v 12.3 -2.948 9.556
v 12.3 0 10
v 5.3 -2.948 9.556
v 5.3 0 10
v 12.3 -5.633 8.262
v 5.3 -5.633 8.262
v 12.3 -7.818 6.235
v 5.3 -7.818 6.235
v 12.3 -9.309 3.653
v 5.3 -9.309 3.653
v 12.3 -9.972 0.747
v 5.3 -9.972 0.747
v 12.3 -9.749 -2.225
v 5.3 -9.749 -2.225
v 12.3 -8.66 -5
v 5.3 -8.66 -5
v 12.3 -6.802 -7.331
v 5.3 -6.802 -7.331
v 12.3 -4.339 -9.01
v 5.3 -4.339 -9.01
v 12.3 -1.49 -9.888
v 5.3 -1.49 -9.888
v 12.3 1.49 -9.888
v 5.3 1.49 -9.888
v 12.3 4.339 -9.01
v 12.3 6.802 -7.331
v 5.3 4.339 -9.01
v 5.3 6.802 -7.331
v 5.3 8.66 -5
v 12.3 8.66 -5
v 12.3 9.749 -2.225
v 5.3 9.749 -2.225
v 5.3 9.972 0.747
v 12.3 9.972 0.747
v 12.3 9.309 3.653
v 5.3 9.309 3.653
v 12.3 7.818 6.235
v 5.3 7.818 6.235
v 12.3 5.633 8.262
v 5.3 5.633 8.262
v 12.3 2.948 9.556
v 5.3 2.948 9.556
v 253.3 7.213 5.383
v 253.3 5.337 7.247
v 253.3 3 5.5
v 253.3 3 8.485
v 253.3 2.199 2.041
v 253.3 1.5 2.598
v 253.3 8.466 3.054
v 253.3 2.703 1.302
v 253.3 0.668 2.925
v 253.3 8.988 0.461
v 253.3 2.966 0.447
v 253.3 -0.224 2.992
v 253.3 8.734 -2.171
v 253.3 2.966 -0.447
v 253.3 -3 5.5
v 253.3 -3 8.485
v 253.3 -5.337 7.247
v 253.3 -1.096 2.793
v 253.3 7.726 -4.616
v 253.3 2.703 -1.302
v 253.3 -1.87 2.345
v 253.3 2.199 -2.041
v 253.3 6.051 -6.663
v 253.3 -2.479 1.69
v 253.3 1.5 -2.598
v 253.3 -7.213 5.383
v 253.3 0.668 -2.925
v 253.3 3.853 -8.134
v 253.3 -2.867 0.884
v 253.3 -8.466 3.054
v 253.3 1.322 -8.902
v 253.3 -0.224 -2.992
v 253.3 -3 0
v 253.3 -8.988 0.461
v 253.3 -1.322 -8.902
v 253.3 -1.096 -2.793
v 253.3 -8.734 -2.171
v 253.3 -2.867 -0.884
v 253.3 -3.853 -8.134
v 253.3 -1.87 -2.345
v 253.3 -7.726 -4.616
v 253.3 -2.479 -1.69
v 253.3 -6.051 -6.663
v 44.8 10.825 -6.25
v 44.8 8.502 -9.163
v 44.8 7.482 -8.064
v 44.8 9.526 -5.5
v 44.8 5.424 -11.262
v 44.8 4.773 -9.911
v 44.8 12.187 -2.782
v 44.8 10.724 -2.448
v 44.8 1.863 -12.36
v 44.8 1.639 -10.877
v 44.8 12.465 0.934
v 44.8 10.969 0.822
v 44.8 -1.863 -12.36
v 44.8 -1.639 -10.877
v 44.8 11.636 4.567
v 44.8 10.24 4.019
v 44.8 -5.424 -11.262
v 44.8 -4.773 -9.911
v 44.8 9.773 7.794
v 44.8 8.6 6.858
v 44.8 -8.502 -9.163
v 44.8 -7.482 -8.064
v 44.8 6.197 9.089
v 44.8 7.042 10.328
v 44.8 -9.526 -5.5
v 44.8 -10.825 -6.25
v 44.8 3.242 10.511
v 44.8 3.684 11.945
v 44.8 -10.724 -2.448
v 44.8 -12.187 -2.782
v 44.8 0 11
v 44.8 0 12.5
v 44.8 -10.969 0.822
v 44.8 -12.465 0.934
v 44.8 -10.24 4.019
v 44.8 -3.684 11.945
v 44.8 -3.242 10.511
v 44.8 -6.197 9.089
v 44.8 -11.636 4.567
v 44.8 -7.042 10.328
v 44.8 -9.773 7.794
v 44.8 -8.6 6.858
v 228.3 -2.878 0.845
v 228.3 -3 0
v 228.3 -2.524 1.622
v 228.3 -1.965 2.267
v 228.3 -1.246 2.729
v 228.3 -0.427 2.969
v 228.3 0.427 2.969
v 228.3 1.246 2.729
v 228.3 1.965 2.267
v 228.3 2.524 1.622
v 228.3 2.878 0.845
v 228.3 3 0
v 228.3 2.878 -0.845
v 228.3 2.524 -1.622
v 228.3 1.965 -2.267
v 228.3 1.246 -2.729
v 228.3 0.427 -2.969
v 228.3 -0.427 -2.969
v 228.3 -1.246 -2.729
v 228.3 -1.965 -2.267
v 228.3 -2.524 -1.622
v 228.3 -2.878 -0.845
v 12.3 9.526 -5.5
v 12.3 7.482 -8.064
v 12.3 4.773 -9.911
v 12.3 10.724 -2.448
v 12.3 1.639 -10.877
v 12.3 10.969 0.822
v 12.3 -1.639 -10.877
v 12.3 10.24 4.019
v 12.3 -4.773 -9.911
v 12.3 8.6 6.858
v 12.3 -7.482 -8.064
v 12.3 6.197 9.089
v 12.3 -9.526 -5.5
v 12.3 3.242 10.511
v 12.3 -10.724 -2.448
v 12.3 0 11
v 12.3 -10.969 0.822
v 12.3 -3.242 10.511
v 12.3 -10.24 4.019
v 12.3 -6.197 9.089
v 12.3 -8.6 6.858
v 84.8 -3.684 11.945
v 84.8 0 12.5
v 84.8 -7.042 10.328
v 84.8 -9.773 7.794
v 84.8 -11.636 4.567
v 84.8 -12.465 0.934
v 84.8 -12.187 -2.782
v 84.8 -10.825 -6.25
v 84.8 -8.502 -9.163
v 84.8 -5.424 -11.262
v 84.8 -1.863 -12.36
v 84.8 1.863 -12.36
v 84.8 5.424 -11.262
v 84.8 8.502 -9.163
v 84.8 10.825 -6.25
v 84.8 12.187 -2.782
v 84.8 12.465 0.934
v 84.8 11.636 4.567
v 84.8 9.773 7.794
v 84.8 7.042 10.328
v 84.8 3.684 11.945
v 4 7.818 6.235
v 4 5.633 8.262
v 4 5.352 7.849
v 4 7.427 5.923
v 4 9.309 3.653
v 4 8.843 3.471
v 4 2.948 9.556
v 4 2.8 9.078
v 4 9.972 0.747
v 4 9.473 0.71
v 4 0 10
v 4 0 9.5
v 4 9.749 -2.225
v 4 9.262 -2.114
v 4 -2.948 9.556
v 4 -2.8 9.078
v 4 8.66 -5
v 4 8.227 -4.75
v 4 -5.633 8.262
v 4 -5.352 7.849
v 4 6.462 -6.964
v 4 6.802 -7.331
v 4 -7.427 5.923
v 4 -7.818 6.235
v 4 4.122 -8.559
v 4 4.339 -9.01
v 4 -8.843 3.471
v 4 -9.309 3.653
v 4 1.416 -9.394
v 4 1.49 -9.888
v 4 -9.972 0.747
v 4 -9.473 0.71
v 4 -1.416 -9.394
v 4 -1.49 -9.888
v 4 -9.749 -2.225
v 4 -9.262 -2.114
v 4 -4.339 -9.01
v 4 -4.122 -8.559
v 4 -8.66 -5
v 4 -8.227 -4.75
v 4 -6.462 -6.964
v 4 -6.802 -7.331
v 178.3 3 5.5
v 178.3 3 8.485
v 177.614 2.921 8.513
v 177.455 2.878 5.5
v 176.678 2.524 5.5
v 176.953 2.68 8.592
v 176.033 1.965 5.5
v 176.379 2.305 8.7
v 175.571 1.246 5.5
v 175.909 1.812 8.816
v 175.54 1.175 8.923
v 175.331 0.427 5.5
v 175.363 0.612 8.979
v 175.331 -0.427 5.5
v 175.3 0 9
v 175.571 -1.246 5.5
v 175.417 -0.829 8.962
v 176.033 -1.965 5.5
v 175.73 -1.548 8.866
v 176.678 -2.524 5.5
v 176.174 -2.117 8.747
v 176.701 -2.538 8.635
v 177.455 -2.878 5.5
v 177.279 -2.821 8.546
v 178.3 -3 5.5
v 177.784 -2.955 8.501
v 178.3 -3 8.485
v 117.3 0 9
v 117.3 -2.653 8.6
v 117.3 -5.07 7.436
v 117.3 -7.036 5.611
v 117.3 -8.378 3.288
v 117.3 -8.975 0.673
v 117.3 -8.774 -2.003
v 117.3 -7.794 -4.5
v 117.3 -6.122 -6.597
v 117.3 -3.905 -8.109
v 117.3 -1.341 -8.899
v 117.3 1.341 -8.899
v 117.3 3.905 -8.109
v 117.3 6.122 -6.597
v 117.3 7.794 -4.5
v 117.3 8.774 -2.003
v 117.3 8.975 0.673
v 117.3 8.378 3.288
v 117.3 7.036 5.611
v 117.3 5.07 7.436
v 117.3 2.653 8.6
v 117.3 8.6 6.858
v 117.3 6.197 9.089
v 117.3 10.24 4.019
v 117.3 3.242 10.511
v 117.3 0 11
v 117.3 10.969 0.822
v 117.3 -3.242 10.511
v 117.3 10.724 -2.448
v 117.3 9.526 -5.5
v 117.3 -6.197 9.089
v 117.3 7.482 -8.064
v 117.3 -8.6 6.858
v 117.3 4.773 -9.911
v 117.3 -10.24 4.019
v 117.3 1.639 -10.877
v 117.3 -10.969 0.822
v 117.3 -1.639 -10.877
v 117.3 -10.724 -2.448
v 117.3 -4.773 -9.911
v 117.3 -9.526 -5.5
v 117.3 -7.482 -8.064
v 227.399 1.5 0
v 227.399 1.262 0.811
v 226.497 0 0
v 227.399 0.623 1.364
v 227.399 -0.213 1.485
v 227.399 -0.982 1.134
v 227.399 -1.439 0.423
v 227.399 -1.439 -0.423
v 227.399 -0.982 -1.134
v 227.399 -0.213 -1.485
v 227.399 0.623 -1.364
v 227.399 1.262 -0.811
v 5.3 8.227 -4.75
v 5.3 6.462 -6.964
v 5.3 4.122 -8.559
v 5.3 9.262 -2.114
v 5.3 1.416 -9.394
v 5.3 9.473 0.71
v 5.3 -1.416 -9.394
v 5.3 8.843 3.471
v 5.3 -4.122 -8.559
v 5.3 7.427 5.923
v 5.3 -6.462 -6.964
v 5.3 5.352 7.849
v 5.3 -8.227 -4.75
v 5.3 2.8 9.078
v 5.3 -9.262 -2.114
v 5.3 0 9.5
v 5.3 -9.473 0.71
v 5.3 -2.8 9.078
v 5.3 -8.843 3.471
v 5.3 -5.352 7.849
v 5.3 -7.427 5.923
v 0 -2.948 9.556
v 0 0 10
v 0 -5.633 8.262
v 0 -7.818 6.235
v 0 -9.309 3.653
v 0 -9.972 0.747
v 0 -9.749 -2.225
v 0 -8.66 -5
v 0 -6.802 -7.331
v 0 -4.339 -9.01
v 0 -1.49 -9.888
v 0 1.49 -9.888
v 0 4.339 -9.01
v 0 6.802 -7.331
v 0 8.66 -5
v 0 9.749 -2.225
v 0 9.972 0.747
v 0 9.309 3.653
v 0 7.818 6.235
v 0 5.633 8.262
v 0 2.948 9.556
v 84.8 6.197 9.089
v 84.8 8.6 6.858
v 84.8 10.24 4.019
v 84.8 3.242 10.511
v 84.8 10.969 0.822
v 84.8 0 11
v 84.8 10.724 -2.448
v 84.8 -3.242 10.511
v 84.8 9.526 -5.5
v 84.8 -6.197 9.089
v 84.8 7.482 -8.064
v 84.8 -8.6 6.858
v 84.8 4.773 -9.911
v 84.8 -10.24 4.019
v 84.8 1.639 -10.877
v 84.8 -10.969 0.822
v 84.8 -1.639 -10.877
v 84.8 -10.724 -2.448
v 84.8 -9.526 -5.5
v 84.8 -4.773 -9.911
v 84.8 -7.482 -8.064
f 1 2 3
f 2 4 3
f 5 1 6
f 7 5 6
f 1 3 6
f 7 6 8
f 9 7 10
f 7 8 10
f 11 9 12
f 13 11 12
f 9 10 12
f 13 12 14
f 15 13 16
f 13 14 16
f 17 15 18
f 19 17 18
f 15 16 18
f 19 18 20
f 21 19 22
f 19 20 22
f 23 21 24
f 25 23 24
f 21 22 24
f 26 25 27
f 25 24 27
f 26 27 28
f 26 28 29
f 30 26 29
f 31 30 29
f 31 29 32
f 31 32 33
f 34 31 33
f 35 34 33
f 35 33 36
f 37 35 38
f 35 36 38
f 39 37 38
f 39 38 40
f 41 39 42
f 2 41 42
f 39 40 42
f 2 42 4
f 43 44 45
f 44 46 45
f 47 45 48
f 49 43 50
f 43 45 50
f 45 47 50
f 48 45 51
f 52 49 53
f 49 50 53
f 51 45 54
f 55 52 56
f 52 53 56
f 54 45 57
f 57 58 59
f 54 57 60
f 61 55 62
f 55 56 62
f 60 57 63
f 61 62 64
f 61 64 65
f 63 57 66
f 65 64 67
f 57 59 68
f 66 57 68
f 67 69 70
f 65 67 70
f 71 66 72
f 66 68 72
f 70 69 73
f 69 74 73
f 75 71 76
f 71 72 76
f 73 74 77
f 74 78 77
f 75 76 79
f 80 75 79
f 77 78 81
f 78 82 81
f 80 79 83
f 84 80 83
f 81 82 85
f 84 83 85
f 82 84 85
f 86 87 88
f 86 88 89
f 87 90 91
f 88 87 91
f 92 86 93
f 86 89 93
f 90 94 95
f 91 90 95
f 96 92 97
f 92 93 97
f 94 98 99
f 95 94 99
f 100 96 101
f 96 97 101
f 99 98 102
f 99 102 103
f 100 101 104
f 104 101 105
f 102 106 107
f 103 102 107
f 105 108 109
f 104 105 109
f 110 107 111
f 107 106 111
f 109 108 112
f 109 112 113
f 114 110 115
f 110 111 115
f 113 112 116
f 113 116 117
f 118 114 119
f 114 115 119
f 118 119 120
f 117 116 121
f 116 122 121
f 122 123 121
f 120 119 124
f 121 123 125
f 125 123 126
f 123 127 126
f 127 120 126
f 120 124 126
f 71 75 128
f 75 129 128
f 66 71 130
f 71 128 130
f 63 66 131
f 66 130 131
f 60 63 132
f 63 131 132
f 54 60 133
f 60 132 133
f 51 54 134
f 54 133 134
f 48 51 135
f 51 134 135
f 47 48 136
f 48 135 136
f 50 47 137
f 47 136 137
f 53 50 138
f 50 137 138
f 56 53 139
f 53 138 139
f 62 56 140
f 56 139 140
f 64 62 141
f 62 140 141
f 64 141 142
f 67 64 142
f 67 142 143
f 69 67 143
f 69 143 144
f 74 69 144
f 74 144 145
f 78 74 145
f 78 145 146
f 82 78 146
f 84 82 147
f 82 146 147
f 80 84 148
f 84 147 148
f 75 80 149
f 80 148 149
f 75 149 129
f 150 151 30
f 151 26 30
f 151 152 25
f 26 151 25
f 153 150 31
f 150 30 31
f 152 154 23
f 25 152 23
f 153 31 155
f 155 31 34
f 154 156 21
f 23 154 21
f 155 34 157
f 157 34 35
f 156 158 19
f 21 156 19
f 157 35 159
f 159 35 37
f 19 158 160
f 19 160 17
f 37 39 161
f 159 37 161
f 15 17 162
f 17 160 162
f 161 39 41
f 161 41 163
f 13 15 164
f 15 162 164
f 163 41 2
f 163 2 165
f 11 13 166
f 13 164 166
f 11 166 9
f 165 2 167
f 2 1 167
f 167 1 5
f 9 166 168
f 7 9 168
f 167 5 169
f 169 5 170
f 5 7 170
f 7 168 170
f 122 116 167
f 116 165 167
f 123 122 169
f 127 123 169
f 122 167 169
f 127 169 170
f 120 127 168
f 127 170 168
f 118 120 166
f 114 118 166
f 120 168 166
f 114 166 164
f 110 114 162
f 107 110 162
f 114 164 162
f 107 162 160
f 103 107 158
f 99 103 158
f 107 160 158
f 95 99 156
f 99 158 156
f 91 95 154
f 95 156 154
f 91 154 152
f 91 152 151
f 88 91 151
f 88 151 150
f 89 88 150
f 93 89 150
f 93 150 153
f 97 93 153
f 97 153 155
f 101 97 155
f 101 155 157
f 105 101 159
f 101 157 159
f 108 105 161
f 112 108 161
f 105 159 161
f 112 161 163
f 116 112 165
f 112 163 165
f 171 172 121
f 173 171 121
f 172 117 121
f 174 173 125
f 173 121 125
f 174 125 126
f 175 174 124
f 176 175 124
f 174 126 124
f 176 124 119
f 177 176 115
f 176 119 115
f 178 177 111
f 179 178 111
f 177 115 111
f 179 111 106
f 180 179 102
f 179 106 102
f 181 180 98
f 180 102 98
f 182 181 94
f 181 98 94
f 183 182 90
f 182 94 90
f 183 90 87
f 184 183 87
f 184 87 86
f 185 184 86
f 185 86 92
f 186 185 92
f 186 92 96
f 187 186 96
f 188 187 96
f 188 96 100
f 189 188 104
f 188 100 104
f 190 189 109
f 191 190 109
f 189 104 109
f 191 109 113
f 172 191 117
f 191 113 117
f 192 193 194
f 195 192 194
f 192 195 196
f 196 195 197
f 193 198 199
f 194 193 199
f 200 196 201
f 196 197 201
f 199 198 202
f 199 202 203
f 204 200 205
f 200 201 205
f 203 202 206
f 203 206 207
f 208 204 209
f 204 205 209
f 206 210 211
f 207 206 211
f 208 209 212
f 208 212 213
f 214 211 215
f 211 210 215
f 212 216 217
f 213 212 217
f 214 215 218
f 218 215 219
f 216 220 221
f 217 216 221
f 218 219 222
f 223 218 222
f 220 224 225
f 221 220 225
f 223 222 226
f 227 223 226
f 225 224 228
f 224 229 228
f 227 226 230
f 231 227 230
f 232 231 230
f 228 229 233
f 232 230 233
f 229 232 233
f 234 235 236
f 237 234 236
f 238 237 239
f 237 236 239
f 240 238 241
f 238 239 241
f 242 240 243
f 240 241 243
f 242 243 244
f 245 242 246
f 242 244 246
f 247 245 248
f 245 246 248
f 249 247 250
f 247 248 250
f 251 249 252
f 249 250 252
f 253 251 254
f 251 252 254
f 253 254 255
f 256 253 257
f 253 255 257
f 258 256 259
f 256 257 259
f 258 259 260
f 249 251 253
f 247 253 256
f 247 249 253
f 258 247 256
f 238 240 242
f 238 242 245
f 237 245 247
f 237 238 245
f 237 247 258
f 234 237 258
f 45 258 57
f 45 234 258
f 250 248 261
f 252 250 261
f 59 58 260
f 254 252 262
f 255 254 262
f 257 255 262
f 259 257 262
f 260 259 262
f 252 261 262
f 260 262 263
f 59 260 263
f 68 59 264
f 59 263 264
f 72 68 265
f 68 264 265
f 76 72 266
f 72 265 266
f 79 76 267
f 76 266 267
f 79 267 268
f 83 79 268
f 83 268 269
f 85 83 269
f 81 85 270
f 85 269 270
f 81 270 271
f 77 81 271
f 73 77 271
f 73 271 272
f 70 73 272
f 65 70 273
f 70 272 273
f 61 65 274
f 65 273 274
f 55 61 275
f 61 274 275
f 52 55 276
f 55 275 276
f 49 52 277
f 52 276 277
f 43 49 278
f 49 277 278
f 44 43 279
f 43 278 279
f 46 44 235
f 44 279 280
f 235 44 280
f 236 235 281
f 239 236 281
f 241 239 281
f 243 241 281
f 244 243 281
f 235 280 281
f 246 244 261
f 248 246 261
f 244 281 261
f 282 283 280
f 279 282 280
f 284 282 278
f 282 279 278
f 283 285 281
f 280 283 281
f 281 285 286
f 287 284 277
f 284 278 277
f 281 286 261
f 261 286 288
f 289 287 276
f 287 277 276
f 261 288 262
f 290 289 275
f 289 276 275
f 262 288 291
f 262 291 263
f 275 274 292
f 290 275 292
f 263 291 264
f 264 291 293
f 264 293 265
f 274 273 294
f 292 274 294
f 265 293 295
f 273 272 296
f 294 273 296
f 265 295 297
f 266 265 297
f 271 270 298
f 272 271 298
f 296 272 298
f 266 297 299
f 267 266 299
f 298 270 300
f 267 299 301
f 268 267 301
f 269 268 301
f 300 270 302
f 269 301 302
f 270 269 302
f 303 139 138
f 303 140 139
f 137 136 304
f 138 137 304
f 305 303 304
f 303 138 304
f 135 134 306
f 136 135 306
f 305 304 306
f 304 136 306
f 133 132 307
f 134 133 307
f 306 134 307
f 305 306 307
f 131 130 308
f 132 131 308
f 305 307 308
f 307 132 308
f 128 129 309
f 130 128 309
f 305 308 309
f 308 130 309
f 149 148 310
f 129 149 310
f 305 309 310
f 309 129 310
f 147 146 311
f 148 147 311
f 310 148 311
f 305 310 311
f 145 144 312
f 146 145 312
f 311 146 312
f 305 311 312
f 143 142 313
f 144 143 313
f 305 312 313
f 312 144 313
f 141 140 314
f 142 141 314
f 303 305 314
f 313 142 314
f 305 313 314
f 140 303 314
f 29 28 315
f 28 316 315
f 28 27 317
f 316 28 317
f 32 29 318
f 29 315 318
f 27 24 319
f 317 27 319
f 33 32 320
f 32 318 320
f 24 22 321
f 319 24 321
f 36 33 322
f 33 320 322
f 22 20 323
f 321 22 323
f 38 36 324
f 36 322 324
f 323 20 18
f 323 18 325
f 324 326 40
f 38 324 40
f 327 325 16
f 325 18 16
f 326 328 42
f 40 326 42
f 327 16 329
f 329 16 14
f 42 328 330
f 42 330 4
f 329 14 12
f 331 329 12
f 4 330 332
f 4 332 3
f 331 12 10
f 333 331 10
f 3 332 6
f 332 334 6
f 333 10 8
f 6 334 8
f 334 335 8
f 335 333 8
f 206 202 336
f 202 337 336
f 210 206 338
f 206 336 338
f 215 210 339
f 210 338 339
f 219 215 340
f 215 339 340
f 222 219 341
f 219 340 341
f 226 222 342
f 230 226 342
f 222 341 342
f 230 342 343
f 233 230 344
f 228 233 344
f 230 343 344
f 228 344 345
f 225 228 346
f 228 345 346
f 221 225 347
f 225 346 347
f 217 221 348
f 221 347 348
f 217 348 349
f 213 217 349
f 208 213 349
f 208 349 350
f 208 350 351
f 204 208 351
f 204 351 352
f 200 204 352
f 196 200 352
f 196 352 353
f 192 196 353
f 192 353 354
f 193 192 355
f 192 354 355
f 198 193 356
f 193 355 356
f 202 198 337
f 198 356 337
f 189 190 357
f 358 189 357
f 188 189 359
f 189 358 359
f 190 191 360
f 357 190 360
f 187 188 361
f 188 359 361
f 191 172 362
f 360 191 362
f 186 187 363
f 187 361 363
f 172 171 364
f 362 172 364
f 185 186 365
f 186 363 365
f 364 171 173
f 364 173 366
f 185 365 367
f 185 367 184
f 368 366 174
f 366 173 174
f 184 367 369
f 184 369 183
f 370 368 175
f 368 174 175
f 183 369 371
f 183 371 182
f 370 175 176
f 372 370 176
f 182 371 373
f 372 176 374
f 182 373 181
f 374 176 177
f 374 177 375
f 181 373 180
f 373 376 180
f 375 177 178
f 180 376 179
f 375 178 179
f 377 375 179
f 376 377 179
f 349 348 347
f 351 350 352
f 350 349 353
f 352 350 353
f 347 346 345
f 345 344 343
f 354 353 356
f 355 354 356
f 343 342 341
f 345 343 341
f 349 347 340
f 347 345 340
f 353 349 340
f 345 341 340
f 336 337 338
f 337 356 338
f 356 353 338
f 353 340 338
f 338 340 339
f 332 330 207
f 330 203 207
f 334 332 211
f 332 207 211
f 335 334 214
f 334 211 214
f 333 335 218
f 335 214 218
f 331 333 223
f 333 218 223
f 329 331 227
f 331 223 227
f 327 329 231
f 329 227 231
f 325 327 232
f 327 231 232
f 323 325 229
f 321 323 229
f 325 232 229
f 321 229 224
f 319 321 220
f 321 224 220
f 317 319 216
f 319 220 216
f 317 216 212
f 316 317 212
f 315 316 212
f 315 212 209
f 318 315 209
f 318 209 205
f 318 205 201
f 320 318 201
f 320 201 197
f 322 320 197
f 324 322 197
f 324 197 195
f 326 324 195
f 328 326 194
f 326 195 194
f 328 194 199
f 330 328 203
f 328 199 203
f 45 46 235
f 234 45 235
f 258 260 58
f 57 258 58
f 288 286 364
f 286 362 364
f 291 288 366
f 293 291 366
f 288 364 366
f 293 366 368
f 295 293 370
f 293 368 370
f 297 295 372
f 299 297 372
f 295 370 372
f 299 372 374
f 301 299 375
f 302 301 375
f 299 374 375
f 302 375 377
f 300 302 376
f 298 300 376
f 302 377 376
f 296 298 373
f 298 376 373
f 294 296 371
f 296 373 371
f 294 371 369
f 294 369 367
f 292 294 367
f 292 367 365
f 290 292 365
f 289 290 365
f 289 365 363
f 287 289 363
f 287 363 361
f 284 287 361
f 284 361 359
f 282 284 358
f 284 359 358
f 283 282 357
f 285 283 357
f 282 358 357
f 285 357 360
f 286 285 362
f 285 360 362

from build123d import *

# Parameters (mm, degrees)
F4_DEPTH = 3.5
F6_D     = 6
F6_DEPTH = 25
F6_TIP   = 1.8025818571


with BuildPart() as f1:
    # F0 (on Front) → F1 (revolve)
    with BuildSketch(Plane.XZ):
        Polygon((0, 10), (0, 0), (253.3, 0), (253.3, 9), (117.3, 9), (117.3, 9.5), (117.3, 11), (84.8, 11), (84.8, 12.5), (44.8, 12.5), (44.8, 11), (12.3, 11), (12.3, 10), (5.3, 10), (5.3, 9.5), (4, 9.5), (4, 10), align=None)
    revolve(axis=Axis((126.65, 0, 0), (1, 0, 0)))

    # F3 (on offset) → F4 (cut)
    with BuildSketch(Plane.XY.offset(9)):
        with BuildLine():
            Line((178.3, -3), (253.3, -3))
            Line((253.3, -3), (253.3, 3))
            Line((253.3, 3), (178.3, 3))
            ThreePointArc((178.3, 3), (175.3, 0), (178.3, -3))
        make_face()
    extrude(amount=-F4_DEPTH, mode=Mode.SUBTRACT)

    # F6
    with Locations(Plane.YZ.offset(253.3)):
        with Locations((0, 0)):
            Hole(F6_D / 2, depth=F6_DEPTH)
            with Locations((0, 0, -(F6_DEPTH + F6_TIP / 2))):  # 118° drill point
                Cone(0, F6_D / 2, F6_TIP, mode=Mode.SUBTRACT)


solid = f1.part
